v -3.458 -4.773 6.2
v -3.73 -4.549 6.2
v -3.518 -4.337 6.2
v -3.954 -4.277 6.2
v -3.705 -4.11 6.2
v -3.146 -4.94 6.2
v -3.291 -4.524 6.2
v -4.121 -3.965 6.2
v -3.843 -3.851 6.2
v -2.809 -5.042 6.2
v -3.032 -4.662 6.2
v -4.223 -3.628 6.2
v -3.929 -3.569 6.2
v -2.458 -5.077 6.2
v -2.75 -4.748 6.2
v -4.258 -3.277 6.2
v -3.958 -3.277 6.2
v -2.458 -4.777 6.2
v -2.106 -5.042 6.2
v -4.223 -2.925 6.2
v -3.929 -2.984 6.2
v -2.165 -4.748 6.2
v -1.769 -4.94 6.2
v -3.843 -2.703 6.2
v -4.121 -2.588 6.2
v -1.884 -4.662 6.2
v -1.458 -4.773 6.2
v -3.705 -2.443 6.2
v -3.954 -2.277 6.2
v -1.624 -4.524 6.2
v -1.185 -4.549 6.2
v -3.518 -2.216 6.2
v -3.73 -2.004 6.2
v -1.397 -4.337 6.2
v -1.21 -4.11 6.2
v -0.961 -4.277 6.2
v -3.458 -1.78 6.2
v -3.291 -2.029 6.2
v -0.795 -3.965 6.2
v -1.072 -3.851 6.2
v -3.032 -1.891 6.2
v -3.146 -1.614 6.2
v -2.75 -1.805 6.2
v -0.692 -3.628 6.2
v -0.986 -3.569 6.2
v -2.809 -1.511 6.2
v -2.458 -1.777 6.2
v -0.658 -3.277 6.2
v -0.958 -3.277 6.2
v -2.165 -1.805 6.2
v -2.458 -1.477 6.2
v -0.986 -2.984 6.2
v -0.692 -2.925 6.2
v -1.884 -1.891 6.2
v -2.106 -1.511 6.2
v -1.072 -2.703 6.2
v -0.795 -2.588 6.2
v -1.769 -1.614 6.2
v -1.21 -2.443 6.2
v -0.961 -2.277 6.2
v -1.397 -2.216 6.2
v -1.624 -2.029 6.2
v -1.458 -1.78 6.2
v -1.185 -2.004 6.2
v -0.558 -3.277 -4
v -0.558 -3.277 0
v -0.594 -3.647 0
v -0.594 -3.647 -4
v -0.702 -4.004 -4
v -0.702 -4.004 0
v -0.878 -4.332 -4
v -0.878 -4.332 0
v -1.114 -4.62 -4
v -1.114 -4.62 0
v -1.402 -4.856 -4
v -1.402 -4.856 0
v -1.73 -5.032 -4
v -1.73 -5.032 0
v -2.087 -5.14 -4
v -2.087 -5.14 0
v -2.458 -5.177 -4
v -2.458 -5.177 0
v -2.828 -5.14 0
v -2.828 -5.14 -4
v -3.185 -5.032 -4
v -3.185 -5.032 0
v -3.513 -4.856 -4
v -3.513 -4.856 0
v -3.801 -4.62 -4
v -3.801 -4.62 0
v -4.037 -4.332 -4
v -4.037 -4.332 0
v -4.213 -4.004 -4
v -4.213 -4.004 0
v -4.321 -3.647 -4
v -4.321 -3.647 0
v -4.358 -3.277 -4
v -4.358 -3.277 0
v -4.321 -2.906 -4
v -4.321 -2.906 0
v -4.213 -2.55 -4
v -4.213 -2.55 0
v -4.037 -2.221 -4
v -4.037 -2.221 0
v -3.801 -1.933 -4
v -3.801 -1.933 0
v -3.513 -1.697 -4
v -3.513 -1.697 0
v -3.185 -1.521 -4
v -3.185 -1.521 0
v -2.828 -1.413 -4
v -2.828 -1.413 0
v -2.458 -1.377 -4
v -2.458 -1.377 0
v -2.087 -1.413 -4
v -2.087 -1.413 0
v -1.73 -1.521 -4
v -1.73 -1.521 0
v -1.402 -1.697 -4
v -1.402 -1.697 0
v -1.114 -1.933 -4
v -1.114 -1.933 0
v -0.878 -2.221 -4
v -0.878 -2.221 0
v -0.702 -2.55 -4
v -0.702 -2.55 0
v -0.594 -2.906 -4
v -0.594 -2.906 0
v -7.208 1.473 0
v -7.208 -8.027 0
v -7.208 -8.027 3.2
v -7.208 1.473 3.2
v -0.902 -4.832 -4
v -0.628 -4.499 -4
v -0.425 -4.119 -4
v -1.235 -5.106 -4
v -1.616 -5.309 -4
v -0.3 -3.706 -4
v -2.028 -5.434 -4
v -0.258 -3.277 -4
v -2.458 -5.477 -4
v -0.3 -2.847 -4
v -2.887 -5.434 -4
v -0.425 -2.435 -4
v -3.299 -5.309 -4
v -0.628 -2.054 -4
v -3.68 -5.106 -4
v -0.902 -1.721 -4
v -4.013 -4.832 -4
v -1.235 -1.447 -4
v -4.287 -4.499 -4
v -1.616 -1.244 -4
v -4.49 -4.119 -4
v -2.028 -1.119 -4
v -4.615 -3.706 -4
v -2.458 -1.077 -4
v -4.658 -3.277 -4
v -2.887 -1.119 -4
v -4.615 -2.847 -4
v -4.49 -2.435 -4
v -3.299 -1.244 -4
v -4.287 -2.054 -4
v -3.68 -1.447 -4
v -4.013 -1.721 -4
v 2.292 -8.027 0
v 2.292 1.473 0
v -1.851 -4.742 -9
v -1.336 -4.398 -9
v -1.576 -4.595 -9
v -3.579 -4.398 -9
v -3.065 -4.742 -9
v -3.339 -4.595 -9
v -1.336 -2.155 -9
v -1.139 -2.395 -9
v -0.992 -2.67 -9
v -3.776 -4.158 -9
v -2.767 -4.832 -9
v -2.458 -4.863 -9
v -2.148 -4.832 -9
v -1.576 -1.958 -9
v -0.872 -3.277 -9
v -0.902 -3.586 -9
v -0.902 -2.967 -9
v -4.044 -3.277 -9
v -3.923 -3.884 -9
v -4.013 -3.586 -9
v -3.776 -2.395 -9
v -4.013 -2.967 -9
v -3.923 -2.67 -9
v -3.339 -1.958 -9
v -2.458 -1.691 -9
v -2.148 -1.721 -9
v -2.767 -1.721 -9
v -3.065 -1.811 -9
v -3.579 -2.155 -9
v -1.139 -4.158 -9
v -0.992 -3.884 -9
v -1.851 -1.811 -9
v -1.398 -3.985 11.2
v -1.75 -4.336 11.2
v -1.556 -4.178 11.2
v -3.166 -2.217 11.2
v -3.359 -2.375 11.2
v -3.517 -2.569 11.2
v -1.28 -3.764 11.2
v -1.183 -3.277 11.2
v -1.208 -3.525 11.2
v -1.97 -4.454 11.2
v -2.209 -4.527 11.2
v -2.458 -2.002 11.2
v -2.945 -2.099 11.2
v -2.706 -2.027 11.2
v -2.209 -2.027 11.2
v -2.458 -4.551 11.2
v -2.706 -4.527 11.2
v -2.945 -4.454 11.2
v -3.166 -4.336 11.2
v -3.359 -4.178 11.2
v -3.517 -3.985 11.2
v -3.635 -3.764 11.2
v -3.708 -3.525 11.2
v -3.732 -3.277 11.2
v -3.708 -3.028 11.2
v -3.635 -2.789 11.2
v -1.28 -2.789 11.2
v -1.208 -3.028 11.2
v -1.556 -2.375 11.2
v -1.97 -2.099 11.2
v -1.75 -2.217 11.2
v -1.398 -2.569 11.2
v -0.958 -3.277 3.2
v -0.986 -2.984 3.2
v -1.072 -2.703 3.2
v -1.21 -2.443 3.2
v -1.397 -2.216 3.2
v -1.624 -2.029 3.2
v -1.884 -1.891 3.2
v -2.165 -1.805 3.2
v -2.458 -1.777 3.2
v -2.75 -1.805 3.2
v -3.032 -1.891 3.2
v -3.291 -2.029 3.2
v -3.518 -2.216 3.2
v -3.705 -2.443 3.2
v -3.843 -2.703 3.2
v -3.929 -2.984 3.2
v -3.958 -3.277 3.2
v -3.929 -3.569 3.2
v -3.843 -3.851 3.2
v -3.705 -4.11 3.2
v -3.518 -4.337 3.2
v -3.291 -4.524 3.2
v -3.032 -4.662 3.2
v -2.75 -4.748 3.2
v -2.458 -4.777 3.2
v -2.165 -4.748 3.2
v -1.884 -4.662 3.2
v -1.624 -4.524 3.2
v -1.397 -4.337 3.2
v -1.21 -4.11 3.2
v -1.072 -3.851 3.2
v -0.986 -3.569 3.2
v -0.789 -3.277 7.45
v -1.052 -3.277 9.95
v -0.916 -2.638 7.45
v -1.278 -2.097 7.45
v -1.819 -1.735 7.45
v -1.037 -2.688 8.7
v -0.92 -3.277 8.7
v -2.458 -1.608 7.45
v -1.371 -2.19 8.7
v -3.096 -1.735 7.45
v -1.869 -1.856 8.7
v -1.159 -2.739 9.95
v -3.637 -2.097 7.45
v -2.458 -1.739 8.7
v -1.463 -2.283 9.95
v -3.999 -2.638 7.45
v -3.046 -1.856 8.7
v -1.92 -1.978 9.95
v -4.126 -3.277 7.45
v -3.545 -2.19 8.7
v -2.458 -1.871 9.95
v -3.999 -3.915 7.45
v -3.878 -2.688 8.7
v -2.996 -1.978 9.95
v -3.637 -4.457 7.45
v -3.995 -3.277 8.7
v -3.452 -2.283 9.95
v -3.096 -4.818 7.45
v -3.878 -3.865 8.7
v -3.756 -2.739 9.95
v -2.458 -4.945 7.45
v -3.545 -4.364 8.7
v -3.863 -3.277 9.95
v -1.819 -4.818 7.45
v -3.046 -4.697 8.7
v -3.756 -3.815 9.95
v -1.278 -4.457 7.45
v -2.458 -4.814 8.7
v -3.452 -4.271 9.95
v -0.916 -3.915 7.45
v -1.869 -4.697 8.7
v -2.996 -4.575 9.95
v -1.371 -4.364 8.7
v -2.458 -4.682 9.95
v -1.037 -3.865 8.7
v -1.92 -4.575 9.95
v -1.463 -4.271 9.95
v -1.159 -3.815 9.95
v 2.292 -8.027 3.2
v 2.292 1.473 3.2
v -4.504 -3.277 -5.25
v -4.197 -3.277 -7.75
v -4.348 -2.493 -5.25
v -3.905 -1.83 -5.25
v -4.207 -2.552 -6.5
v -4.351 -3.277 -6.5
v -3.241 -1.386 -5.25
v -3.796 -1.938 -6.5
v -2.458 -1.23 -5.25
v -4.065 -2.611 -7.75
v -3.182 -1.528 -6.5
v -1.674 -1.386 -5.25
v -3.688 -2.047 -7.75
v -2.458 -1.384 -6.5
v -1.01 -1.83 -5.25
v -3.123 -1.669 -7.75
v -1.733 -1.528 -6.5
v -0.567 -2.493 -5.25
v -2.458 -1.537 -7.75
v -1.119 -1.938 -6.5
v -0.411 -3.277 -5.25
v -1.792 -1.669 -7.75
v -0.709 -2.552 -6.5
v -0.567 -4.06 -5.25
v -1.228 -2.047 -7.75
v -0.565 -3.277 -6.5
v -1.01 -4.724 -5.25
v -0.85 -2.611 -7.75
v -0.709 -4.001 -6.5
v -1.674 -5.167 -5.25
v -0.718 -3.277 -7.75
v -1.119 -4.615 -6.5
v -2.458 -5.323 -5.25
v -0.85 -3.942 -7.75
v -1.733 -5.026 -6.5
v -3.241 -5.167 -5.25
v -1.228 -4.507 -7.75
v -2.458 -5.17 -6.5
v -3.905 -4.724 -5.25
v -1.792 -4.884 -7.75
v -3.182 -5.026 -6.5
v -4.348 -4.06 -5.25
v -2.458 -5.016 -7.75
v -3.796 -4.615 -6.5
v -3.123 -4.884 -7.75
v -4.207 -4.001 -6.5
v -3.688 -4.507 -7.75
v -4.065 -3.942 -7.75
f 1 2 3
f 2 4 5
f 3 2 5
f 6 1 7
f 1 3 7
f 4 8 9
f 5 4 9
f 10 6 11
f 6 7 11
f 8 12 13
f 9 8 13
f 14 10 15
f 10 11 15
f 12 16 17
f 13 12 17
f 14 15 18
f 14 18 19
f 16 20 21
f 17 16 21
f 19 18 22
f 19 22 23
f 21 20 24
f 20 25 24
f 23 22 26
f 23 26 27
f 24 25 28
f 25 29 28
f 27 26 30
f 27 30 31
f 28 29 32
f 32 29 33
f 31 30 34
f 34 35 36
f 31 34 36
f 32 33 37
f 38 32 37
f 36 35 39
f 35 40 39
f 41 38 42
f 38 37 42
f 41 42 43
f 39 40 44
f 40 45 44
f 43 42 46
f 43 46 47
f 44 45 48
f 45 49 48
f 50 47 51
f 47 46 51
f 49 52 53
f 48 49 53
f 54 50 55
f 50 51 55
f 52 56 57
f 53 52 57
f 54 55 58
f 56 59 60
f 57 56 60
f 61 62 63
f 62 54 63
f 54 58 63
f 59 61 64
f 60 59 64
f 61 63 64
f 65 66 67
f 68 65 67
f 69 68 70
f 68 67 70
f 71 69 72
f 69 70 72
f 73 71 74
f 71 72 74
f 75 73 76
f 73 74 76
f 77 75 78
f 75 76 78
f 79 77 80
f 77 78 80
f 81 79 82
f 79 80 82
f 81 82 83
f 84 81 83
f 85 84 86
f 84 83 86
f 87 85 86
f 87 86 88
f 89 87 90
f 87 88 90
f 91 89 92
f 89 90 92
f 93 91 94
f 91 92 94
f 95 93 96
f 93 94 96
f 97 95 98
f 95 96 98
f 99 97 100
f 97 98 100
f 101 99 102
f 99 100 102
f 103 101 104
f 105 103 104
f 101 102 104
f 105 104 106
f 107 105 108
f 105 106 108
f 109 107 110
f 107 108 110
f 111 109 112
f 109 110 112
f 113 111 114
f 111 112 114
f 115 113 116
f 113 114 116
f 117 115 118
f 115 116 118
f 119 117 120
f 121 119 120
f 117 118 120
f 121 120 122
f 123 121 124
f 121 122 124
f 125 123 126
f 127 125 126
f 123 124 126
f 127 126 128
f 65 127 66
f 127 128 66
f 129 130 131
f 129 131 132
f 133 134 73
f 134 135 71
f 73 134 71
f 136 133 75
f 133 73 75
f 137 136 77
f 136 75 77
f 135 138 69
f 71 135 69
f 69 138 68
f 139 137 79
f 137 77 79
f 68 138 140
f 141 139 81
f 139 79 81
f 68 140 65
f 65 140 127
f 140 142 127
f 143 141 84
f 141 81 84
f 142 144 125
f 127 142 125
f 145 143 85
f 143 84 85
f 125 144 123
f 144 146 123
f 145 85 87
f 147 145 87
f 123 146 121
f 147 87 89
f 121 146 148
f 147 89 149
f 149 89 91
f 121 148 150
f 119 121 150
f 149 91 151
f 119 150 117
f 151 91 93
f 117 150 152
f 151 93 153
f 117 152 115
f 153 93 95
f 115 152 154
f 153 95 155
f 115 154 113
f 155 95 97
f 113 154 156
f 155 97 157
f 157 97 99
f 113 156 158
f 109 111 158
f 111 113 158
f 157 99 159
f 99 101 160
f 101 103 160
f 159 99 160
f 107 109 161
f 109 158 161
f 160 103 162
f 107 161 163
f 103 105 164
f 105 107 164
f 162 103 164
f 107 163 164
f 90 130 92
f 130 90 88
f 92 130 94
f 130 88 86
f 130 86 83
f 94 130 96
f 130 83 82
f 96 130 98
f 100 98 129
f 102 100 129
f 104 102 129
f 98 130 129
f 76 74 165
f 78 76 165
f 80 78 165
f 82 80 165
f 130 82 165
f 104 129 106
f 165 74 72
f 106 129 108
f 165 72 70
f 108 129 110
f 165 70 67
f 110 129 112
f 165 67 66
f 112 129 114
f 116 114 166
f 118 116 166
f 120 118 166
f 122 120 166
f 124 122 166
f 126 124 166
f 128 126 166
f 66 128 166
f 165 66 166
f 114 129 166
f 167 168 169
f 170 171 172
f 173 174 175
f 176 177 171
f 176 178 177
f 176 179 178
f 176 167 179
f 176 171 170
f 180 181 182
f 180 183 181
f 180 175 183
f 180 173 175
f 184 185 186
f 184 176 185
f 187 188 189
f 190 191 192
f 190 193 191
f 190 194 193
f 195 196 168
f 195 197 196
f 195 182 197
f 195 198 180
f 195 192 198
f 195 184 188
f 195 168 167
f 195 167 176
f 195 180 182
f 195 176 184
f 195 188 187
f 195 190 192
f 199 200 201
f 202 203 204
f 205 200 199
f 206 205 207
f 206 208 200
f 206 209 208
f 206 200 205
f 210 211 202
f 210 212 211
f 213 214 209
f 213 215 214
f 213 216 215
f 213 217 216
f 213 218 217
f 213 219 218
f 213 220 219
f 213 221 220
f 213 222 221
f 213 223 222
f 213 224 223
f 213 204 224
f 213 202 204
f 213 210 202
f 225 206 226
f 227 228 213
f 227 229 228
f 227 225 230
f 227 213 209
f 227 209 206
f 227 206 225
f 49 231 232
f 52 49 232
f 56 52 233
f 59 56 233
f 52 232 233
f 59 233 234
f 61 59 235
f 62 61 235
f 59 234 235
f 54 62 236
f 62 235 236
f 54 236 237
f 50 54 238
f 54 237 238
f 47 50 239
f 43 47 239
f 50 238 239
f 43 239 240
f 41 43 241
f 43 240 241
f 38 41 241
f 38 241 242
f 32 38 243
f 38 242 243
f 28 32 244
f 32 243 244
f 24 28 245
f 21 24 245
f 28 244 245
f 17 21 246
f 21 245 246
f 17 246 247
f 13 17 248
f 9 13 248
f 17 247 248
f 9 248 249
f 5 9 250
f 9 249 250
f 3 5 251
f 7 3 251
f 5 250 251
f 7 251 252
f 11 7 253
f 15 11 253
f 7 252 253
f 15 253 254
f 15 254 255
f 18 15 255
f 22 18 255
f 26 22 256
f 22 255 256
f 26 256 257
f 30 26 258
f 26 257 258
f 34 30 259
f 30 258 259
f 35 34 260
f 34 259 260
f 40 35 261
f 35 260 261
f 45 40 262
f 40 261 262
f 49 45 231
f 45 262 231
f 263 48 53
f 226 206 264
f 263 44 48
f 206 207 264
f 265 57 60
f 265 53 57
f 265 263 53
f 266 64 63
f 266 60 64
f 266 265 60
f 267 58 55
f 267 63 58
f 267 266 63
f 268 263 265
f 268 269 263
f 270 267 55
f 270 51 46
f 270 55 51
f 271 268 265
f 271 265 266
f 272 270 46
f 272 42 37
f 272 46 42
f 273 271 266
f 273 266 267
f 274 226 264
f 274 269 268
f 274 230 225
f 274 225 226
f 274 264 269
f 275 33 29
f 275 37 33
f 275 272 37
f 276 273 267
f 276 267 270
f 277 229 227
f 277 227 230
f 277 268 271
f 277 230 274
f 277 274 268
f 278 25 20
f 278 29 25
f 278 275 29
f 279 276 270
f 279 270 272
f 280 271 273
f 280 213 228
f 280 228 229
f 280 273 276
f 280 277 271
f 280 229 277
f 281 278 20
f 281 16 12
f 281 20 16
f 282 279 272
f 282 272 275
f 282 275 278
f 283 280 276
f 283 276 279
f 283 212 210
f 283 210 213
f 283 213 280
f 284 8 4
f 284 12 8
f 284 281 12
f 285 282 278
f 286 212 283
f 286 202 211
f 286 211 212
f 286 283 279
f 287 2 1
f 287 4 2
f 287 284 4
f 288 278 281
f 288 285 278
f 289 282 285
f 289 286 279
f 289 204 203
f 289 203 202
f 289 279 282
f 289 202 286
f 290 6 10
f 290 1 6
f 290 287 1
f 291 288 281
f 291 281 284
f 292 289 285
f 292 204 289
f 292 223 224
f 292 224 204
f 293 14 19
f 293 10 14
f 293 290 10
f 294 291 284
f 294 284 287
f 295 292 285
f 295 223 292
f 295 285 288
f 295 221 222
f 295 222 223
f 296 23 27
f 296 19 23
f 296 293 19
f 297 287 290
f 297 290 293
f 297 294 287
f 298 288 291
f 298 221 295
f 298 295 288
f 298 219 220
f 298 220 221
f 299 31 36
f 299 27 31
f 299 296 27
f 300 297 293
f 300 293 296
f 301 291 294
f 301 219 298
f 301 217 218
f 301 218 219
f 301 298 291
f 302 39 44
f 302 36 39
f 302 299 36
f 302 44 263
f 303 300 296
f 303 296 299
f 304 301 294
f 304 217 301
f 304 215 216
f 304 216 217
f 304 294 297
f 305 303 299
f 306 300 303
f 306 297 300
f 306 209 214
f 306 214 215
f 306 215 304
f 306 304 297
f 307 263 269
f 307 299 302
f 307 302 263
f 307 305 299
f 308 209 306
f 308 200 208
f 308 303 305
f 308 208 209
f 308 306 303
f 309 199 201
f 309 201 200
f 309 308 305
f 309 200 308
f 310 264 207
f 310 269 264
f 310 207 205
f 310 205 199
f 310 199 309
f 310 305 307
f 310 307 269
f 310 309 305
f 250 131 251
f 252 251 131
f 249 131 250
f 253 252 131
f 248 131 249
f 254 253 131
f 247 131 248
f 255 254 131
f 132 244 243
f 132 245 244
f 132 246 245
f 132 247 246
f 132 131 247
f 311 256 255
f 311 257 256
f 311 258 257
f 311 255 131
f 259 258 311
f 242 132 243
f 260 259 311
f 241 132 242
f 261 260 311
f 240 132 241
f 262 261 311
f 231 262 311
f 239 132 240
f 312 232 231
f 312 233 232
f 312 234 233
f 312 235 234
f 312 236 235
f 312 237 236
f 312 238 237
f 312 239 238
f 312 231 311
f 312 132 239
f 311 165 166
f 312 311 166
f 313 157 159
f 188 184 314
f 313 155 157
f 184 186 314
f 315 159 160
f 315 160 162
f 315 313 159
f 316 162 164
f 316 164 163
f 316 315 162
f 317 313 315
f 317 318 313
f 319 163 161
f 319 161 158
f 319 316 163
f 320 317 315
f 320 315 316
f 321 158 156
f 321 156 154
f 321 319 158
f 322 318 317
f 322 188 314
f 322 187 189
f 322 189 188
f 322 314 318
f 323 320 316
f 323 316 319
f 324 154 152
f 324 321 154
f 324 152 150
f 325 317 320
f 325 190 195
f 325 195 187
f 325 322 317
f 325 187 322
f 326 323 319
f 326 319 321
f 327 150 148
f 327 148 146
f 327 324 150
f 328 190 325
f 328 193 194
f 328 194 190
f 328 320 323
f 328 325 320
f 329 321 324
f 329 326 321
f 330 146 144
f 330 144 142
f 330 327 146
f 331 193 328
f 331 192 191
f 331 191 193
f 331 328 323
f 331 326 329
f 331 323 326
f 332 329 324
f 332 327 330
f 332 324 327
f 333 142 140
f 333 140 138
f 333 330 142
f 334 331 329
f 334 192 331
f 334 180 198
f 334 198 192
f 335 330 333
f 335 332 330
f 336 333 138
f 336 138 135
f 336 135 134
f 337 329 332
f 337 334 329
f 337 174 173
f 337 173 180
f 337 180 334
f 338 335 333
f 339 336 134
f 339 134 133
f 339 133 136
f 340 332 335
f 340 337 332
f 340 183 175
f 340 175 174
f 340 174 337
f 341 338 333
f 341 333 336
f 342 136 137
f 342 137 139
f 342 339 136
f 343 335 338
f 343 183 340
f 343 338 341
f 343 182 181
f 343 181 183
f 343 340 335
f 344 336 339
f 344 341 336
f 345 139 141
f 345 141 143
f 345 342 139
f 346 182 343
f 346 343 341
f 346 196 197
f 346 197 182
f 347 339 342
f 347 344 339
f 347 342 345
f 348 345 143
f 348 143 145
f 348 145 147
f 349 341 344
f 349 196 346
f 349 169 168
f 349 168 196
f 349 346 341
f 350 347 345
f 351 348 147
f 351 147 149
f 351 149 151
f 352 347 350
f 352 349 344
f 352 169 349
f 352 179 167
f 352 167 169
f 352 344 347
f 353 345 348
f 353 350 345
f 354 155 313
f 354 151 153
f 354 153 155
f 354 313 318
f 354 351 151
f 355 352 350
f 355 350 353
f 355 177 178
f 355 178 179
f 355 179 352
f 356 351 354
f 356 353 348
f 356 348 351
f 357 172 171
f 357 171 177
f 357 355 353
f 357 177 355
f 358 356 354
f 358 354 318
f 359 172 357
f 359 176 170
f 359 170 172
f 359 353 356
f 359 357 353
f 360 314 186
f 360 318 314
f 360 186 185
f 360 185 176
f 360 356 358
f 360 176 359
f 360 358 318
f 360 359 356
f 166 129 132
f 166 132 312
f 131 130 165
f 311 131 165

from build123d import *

# Parameters (mm, degrees)
ESQUISSE1_W      = 9.5
ESQUISSE1_H      = 9.5
EXTRUSION1_DEPTH = 3.2
ESQUISSE2_R      = 1.5
EXTRUSION2_DEPTH = 3
ESQUISSE3_R      = 1.8
EXTRUSION3_DEPTH = 5
EXTRUSION3_TAPER = 6
ESQUISSE4_R      = 1.9
EXTRUSION4_DEPTH = 4
ESQUISSE5_R      = 2.2
EXTRUSION5_DEPTH = 5
EXTRUSION5_TAPER = 7


with BuildPart() as part:
    # Esquisse1 → Extrusion1 (new body)
    with BuildSketch(Plane.XY):
        with Locations((-2.457587253, -3.276631259)):
            Rectangle(ESQUISSE1_W, ESQUISSE1_H)
    extrude(amount=EXTRUSION1_DEPTH)

    # Esquisse2 → Extrusion2 (add)
    with BuildSketch(Plane.XY.offset(3.2)):
        with Locations((-2.457587253, -3.276631259)):
            Circle(ESQUISSE2_R)
    extrude(amount=EXTRUSION2_DEPTH)

    # Esquisse3 → Extrusion3 (add)
    with BuildSketch(Plane.XY.offset(6.2)):
        with Locations((-2.457587253, -3.276631259)):
            Circle(ESQUISSE3_R)
    extrude(amount=EXTRUSION3_DEPTH, taper=EXTRUSION3_TAPER)

    # Esquisse4 → Extrusion4 (add)
    with BuildSketch(Plane(origin=(0, 0, 0), x_dir=(-1, 0, 0), z_dir=(0, 0, -1))):
        with Locations(Location((2.457587253, -3.276631259, 0), (0, 0, 180))):
            Circle(ESQUISSE4_R)
    extrude(amount=EXTRUSION4_DEPTH)

    # Esquisse5 → Extrusion5 (add)
    with BuildSketch(Plane(origin=(0, 0, -4), x_dir=(-1, 0, 0), z_dir=(0, 0, -1))):
        with Locations((2.457587253, -3.276631259)):
            Circle(ESQUISSE5_R)
    extrude(amount=EXTRUSION5_DEPTH, taper=EXTRUSION5_TAPER)


solid = part.part
